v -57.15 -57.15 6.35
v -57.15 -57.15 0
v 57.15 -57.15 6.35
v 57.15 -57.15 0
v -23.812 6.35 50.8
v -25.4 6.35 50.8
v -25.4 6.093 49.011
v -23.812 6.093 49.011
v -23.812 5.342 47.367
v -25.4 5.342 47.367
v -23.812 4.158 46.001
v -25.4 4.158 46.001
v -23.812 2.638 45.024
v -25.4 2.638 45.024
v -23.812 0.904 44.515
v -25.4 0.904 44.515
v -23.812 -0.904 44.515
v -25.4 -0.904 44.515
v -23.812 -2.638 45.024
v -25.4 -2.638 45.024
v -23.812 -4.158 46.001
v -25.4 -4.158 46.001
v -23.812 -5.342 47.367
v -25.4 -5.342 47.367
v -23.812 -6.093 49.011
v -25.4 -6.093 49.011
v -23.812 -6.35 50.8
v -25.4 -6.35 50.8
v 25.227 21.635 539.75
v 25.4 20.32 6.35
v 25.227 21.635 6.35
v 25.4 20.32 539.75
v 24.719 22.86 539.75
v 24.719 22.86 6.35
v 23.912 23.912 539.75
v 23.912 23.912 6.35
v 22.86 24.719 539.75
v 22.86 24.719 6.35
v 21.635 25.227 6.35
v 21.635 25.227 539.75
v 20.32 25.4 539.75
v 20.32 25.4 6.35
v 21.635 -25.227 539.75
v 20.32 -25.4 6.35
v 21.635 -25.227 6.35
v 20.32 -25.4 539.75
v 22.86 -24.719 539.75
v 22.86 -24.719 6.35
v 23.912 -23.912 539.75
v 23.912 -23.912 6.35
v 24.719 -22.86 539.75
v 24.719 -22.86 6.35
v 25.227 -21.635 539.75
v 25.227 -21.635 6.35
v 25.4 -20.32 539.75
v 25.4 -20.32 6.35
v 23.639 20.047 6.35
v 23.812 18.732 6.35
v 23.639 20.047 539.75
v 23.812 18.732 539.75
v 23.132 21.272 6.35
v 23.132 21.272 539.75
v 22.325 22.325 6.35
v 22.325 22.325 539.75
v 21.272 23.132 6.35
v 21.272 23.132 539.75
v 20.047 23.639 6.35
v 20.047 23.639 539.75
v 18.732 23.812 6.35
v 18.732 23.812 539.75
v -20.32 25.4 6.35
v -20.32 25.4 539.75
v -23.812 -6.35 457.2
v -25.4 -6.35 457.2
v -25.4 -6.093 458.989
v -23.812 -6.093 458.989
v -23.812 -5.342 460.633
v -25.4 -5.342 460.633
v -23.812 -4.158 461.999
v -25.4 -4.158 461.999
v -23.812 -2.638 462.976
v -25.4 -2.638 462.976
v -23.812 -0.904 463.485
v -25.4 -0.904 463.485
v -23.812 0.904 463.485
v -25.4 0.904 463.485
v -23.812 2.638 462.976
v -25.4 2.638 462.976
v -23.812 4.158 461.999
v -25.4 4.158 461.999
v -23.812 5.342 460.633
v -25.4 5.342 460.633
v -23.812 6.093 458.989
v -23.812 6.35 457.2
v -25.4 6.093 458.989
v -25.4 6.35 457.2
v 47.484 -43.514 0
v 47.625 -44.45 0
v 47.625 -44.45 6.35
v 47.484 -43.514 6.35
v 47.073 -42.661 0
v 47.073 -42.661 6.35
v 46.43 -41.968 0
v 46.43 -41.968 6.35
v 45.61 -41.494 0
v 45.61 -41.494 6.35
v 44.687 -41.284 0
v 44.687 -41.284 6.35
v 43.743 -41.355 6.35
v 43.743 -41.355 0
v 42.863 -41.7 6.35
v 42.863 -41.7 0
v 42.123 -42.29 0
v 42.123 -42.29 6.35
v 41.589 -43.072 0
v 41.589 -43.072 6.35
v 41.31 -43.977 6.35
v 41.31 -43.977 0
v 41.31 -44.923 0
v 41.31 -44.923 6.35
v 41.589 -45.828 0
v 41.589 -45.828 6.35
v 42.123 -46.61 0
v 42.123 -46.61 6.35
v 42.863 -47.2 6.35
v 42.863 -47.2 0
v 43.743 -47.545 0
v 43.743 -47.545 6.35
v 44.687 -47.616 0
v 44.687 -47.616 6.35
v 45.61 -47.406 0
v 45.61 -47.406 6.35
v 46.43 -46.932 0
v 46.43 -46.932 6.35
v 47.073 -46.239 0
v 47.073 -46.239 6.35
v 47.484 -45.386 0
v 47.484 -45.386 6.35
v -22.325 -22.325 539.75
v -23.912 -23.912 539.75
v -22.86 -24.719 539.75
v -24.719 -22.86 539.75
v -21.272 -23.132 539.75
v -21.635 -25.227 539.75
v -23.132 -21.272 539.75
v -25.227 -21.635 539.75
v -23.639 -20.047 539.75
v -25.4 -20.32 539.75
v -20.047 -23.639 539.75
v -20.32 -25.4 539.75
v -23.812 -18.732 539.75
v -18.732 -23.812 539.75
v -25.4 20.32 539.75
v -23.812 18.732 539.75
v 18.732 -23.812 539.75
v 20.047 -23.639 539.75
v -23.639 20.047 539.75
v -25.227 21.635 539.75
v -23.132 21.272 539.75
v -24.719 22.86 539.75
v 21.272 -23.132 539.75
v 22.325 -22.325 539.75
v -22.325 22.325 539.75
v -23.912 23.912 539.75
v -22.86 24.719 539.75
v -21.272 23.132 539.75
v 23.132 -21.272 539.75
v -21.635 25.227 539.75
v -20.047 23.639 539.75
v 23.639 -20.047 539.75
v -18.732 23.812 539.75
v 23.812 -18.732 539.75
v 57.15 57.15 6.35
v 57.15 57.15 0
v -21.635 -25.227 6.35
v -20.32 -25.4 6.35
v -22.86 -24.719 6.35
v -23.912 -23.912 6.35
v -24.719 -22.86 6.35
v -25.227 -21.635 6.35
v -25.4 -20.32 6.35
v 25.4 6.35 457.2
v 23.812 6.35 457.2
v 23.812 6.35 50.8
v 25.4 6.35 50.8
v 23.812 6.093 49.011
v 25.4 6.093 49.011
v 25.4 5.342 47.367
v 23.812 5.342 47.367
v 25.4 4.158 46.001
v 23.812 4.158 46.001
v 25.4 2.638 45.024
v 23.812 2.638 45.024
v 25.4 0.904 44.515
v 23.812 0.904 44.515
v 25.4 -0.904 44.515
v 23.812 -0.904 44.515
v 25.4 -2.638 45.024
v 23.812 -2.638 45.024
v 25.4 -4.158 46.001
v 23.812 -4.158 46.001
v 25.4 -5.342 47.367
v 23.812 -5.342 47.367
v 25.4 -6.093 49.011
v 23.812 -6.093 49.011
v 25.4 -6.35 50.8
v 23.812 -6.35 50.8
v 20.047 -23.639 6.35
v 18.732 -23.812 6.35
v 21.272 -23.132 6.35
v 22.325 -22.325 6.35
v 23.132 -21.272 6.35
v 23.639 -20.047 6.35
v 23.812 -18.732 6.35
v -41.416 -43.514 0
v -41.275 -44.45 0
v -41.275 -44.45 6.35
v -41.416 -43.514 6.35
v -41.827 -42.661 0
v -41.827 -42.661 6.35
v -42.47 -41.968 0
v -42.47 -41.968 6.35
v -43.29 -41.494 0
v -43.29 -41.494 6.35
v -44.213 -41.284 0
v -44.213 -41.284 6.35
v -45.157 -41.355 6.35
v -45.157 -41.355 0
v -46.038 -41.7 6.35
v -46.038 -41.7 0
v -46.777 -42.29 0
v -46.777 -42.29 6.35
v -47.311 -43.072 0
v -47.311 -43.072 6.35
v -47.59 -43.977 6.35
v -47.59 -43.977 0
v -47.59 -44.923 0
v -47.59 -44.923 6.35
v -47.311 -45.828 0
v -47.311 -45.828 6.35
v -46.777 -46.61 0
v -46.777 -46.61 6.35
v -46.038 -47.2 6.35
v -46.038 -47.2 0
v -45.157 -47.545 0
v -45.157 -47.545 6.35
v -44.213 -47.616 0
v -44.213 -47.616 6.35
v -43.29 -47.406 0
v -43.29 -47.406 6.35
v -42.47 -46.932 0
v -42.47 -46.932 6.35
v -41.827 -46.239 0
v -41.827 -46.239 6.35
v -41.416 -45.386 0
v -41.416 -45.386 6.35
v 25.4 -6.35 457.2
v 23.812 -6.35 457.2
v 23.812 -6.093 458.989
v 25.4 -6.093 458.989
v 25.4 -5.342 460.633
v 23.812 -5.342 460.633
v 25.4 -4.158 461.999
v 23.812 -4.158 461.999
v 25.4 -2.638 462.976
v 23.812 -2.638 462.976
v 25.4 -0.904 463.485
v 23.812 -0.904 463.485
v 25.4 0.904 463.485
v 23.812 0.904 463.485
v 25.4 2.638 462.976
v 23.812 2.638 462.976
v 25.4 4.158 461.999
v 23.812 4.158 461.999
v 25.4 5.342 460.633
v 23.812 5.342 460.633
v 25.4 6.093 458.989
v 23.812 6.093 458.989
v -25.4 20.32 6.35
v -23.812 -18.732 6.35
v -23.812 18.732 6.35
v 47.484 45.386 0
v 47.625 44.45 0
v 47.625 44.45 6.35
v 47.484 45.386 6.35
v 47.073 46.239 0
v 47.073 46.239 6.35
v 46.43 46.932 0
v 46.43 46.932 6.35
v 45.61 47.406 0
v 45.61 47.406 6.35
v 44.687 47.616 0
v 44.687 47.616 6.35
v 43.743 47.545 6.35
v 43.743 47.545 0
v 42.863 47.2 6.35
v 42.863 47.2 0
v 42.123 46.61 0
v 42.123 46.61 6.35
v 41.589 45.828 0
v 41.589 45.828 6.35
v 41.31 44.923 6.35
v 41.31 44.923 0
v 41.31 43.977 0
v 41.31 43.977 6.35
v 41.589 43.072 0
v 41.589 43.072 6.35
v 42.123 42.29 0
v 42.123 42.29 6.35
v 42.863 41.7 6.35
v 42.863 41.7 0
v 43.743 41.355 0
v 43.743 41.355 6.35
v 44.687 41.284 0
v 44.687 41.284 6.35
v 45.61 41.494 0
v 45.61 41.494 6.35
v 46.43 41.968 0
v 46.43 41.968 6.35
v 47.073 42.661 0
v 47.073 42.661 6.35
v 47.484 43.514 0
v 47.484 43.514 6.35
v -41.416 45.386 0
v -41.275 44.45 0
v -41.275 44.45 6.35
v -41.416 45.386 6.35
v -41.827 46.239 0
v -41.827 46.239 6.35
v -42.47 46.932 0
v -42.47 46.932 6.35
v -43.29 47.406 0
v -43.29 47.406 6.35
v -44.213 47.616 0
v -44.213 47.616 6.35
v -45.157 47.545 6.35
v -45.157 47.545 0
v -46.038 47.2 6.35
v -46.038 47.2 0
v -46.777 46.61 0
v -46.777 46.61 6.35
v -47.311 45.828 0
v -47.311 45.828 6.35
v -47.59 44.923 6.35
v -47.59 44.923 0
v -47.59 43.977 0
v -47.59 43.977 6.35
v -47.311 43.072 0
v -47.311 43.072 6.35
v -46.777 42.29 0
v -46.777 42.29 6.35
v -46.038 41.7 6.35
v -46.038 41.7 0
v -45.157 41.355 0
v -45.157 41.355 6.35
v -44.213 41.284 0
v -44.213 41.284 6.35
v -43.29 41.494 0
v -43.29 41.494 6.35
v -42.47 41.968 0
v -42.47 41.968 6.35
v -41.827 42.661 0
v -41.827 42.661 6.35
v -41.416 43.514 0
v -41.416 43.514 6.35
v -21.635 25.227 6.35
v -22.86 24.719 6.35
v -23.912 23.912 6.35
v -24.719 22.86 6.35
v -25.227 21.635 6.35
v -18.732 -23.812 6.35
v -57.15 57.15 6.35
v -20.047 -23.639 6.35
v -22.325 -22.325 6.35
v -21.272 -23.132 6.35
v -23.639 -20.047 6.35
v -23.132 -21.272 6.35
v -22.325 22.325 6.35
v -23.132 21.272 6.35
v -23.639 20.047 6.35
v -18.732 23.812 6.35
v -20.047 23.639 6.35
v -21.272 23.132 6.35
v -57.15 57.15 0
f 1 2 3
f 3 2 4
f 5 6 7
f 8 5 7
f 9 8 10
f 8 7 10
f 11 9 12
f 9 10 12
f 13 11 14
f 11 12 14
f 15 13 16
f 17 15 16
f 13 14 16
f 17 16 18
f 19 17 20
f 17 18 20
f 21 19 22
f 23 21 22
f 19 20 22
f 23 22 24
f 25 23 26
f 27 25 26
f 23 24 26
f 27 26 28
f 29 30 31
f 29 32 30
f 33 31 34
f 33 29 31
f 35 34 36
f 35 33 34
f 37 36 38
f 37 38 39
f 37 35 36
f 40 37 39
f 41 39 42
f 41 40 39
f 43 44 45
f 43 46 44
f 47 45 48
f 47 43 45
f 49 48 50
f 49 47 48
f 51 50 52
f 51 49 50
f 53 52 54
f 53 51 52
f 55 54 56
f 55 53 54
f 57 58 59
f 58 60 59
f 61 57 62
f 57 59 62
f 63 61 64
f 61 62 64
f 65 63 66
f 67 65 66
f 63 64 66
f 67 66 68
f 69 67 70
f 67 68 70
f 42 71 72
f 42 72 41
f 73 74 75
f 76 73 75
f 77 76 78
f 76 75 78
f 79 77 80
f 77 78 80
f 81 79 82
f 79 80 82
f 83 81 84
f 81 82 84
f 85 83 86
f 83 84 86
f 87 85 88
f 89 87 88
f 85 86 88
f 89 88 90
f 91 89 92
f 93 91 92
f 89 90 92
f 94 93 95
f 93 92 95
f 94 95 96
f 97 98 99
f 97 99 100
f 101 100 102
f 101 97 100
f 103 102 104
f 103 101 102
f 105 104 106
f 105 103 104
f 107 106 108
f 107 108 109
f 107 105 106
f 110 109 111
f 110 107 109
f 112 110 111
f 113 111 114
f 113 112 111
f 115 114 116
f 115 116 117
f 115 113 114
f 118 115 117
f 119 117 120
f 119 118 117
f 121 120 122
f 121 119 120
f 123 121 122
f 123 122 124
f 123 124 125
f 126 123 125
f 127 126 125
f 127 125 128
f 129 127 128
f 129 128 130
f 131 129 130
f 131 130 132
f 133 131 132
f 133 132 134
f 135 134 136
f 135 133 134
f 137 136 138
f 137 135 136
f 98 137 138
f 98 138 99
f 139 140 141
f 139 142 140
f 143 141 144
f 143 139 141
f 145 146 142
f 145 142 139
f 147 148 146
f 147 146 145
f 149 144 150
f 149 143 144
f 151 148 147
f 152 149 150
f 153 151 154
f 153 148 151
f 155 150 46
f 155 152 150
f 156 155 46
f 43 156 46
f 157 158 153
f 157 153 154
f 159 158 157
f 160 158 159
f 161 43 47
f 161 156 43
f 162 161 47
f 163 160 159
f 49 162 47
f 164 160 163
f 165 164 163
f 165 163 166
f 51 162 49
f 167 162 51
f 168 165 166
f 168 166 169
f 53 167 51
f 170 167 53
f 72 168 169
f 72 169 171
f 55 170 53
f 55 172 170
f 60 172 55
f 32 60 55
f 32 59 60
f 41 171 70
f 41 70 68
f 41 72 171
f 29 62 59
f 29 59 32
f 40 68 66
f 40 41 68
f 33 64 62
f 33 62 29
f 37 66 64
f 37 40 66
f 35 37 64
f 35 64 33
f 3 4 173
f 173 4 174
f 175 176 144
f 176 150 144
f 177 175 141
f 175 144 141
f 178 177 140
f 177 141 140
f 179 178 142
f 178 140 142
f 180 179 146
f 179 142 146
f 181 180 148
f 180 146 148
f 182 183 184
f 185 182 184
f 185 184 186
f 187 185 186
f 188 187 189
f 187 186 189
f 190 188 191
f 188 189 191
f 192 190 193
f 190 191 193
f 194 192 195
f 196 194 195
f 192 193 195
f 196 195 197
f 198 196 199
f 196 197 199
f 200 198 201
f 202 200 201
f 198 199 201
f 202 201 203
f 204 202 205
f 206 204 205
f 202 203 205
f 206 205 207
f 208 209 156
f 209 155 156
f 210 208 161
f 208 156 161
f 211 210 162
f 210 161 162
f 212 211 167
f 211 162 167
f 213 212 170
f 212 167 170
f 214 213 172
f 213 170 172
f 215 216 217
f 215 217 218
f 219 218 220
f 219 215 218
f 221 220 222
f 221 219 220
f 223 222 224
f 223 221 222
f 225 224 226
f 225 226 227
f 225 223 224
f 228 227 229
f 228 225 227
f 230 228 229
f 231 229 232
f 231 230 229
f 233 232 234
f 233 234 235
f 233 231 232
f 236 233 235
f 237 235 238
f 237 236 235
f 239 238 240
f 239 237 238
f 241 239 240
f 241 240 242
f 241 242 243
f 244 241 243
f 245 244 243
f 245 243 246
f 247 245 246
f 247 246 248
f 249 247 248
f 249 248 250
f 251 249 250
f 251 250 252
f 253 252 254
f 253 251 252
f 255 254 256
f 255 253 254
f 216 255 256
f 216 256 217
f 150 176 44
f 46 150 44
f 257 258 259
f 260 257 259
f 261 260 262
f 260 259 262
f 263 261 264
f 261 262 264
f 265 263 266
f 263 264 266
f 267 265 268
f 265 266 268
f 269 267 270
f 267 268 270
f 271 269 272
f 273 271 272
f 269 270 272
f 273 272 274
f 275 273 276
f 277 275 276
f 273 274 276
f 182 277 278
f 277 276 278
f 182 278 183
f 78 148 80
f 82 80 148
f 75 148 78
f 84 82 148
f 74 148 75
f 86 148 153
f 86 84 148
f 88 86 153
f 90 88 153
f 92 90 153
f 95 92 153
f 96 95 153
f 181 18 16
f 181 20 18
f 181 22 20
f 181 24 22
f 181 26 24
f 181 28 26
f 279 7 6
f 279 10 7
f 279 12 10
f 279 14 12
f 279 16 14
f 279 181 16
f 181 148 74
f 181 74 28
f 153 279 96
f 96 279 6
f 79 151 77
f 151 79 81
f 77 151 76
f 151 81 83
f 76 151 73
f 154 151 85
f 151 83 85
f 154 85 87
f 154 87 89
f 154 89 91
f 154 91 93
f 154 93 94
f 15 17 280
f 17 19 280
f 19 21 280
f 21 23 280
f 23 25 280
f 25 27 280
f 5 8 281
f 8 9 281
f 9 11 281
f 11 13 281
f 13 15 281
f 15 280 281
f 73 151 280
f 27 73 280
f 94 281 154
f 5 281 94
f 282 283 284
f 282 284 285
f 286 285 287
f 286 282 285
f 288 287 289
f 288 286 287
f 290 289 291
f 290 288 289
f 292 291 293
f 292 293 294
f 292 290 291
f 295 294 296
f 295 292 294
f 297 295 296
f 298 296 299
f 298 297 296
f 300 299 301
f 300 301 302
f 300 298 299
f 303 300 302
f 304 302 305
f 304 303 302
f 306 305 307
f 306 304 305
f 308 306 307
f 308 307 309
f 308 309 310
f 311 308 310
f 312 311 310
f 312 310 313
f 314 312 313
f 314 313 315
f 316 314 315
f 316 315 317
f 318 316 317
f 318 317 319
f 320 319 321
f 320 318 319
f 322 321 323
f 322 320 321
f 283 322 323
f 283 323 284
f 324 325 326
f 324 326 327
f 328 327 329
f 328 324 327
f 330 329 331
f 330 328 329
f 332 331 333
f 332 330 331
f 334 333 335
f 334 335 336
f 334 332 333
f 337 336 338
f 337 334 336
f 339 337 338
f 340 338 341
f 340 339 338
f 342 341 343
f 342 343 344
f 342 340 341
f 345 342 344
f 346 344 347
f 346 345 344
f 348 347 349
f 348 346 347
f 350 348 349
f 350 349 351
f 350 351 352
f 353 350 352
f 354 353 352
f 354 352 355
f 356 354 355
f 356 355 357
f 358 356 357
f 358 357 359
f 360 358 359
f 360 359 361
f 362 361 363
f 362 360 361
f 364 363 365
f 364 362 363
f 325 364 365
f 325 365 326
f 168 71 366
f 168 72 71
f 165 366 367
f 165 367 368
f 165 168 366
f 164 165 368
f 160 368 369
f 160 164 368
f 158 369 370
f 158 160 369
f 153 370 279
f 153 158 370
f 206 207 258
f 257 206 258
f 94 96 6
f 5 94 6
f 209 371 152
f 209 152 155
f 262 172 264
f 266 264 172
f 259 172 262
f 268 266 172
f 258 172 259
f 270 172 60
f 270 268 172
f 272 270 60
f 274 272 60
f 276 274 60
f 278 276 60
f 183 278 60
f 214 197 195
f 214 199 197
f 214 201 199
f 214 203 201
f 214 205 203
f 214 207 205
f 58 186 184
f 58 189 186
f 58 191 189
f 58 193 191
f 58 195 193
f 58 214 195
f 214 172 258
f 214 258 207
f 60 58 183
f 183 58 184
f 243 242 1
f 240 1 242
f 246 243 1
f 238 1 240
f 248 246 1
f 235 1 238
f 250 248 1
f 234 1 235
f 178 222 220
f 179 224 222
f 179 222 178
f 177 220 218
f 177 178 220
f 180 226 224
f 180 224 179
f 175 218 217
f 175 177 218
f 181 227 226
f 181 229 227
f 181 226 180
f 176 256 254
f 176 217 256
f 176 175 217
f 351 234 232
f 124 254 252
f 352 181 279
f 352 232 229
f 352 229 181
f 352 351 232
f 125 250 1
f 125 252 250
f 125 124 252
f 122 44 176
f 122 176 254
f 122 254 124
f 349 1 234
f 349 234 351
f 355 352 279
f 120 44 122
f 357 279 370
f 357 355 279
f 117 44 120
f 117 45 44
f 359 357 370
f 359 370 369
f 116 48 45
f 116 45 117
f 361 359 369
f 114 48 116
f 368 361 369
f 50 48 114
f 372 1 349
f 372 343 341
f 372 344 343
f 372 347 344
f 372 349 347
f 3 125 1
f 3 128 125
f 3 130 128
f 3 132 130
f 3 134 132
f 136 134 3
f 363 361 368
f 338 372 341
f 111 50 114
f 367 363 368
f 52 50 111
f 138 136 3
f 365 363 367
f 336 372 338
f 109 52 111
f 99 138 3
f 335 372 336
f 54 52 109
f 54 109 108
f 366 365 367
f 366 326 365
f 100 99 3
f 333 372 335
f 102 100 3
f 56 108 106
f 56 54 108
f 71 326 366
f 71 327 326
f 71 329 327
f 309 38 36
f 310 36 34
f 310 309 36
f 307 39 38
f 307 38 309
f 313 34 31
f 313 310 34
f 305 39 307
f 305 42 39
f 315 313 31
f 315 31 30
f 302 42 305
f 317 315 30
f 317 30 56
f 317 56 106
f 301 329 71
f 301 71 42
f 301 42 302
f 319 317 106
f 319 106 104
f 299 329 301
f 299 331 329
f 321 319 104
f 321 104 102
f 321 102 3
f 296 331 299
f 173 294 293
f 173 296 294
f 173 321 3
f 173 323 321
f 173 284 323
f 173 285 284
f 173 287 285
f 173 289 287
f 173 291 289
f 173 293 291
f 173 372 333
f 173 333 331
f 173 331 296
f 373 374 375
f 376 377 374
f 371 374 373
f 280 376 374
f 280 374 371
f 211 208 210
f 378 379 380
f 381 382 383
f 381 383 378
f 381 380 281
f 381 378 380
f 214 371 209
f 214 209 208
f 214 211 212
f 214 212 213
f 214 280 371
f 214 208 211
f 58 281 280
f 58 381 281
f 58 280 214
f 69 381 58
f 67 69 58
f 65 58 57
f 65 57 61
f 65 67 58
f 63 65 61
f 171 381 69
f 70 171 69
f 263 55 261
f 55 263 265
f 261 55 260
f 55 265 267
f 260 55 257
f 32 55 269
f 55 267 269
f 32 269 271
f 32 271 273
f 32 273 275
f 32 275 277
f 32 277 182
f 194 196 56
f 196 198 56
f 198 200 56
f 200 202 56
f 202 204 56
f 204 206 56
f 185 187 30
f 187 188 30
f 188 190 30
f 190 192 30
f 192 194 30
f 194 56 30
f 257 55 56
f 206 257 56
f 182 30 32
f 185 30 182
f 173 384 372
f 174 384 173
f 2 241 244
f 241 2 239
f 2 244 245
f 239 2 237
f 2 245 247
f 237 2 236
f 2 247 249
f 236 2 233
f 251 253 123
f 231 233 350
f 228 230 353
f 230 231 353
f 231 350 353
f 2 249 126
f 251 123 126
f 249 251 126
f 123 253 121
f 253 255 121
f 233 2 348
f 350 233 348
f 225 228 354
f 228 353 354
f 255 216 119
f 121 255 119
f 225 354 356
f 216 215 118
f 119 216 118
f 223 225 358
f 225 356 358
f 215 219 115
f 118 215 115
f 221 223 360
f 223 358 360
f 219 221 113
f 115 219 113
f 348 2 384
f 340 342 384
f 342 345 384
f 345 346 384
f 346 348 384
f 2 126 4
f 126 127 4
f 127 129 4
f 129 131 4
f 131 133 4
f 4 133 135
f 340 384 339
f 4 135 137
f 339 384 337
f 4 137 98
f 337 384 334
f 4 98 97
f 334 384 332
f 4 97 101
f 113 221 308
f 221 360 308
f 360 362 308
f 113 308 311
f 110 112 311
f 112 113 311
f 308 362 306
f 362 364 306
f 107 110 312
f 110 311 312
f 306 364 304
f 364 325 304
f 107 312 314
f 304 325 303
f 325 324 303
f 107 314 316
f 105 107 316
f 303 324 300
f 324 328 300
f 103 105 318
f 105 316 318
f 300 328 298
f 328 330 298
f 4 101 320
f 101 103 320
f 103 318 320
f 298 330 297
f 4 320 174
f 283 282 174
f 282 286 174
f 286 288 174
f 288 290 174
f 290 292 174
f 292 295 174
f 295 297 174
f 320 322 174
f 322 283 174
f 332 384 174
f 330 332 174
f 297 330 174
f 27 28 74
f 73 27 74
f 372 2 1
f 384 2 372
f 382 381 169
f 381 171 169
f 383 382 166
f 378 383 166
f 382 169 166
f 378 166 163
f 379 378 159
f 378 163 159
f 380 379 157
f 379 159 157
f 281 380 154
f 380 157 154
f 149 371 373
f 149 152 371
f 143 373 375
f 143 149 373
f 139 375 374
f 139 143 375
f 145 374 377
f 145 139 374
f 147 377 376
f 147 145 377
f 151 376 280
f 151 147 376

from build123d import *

# Parameters (mm, degrees)
F0_W     = 114.3
F0_H     = 114.3
F0_R     = 3.175
F1_DEPTH = 6.35
F2_W     = 50.8
F2_H     = 50.8
F2_W_2   = 47.625
F2_H_2   = 47.625
F3_DEPTH = 533.4
F4_R     = 5.08
F6_DEPTH = 82.551


with BuildPart() as f1:
    # F0 (on Top) → F1 (new body)
    with BuildSketch(Plane.XY):
        Rectangle(F0_W, F0_H)
        with Locations((-44.45, -44.45)):
            Circle(F0_R, mode=Mode.SUBTRACT)
        with Locations((44.45, -44.45)):
            Circle(F0_R, mode=Mode.SUBTRACT)
        with Locations((-44.45, 44.45)):
            Circle(F0_R, mode=Mode.SUBTRACT)
        with Locations((44.45, 44.45)):
            Circle(F0_R, mode=Mode.SUBTRACT)
    extrude(amount=F1_DEPTH)

    # F2 (on face) → F3 (join)
    with BuildSketch(Plane.XY.offset(6.35)):
        Rectangle(F2_W, F2_H)
        Rectangle(F2_W_2, F2_H_2, mode=Mode.SUBTRACT)
    extrude(amount=F3_DEPTH)

    # F4
    f4_edges = [f1.edges().sort_by_distance(p)[0] for p in [
        (25.4, 25.4, 273.05),
        (25.4, -25.4, 273.05),
        (-25.4, 25.4, 273.05),
        (-25.4, -25.4, 273.05),
        (-23.8125, -23.8125, 273.05),
        (23.8125, 23.8125, 273.05),
        (-23.8125, 23.8125, 273.05),
        (23.8125, -23.8125, 273.05),
    ]]
    fillet(f4_edges, radius=F4_R)

    # F5 (on face) → F6 (cut, through all)
    with BuildSketch(Plane(origin=(-25.4, 0, 0), x_dir=(0, -1, 0), z_dir=(-1, 0, 0))):
        with BuildLine():
            ThreePointArc((-6.35, 50.8), (0, 44.45), (6.35, 50.8))
            Line((6.35, 50.8), (6.35, 457.2))
            ThreePointArc((6.35, 457.2), (0, 463.55), (-6.35, 457.2))
            Line((-6.35, 457.2), (-6.35, 50.8))
        make_face()
    extrude(amount=-F6_DEPTH, mode=Mode.SUBTRACT)


solid = f1.part
